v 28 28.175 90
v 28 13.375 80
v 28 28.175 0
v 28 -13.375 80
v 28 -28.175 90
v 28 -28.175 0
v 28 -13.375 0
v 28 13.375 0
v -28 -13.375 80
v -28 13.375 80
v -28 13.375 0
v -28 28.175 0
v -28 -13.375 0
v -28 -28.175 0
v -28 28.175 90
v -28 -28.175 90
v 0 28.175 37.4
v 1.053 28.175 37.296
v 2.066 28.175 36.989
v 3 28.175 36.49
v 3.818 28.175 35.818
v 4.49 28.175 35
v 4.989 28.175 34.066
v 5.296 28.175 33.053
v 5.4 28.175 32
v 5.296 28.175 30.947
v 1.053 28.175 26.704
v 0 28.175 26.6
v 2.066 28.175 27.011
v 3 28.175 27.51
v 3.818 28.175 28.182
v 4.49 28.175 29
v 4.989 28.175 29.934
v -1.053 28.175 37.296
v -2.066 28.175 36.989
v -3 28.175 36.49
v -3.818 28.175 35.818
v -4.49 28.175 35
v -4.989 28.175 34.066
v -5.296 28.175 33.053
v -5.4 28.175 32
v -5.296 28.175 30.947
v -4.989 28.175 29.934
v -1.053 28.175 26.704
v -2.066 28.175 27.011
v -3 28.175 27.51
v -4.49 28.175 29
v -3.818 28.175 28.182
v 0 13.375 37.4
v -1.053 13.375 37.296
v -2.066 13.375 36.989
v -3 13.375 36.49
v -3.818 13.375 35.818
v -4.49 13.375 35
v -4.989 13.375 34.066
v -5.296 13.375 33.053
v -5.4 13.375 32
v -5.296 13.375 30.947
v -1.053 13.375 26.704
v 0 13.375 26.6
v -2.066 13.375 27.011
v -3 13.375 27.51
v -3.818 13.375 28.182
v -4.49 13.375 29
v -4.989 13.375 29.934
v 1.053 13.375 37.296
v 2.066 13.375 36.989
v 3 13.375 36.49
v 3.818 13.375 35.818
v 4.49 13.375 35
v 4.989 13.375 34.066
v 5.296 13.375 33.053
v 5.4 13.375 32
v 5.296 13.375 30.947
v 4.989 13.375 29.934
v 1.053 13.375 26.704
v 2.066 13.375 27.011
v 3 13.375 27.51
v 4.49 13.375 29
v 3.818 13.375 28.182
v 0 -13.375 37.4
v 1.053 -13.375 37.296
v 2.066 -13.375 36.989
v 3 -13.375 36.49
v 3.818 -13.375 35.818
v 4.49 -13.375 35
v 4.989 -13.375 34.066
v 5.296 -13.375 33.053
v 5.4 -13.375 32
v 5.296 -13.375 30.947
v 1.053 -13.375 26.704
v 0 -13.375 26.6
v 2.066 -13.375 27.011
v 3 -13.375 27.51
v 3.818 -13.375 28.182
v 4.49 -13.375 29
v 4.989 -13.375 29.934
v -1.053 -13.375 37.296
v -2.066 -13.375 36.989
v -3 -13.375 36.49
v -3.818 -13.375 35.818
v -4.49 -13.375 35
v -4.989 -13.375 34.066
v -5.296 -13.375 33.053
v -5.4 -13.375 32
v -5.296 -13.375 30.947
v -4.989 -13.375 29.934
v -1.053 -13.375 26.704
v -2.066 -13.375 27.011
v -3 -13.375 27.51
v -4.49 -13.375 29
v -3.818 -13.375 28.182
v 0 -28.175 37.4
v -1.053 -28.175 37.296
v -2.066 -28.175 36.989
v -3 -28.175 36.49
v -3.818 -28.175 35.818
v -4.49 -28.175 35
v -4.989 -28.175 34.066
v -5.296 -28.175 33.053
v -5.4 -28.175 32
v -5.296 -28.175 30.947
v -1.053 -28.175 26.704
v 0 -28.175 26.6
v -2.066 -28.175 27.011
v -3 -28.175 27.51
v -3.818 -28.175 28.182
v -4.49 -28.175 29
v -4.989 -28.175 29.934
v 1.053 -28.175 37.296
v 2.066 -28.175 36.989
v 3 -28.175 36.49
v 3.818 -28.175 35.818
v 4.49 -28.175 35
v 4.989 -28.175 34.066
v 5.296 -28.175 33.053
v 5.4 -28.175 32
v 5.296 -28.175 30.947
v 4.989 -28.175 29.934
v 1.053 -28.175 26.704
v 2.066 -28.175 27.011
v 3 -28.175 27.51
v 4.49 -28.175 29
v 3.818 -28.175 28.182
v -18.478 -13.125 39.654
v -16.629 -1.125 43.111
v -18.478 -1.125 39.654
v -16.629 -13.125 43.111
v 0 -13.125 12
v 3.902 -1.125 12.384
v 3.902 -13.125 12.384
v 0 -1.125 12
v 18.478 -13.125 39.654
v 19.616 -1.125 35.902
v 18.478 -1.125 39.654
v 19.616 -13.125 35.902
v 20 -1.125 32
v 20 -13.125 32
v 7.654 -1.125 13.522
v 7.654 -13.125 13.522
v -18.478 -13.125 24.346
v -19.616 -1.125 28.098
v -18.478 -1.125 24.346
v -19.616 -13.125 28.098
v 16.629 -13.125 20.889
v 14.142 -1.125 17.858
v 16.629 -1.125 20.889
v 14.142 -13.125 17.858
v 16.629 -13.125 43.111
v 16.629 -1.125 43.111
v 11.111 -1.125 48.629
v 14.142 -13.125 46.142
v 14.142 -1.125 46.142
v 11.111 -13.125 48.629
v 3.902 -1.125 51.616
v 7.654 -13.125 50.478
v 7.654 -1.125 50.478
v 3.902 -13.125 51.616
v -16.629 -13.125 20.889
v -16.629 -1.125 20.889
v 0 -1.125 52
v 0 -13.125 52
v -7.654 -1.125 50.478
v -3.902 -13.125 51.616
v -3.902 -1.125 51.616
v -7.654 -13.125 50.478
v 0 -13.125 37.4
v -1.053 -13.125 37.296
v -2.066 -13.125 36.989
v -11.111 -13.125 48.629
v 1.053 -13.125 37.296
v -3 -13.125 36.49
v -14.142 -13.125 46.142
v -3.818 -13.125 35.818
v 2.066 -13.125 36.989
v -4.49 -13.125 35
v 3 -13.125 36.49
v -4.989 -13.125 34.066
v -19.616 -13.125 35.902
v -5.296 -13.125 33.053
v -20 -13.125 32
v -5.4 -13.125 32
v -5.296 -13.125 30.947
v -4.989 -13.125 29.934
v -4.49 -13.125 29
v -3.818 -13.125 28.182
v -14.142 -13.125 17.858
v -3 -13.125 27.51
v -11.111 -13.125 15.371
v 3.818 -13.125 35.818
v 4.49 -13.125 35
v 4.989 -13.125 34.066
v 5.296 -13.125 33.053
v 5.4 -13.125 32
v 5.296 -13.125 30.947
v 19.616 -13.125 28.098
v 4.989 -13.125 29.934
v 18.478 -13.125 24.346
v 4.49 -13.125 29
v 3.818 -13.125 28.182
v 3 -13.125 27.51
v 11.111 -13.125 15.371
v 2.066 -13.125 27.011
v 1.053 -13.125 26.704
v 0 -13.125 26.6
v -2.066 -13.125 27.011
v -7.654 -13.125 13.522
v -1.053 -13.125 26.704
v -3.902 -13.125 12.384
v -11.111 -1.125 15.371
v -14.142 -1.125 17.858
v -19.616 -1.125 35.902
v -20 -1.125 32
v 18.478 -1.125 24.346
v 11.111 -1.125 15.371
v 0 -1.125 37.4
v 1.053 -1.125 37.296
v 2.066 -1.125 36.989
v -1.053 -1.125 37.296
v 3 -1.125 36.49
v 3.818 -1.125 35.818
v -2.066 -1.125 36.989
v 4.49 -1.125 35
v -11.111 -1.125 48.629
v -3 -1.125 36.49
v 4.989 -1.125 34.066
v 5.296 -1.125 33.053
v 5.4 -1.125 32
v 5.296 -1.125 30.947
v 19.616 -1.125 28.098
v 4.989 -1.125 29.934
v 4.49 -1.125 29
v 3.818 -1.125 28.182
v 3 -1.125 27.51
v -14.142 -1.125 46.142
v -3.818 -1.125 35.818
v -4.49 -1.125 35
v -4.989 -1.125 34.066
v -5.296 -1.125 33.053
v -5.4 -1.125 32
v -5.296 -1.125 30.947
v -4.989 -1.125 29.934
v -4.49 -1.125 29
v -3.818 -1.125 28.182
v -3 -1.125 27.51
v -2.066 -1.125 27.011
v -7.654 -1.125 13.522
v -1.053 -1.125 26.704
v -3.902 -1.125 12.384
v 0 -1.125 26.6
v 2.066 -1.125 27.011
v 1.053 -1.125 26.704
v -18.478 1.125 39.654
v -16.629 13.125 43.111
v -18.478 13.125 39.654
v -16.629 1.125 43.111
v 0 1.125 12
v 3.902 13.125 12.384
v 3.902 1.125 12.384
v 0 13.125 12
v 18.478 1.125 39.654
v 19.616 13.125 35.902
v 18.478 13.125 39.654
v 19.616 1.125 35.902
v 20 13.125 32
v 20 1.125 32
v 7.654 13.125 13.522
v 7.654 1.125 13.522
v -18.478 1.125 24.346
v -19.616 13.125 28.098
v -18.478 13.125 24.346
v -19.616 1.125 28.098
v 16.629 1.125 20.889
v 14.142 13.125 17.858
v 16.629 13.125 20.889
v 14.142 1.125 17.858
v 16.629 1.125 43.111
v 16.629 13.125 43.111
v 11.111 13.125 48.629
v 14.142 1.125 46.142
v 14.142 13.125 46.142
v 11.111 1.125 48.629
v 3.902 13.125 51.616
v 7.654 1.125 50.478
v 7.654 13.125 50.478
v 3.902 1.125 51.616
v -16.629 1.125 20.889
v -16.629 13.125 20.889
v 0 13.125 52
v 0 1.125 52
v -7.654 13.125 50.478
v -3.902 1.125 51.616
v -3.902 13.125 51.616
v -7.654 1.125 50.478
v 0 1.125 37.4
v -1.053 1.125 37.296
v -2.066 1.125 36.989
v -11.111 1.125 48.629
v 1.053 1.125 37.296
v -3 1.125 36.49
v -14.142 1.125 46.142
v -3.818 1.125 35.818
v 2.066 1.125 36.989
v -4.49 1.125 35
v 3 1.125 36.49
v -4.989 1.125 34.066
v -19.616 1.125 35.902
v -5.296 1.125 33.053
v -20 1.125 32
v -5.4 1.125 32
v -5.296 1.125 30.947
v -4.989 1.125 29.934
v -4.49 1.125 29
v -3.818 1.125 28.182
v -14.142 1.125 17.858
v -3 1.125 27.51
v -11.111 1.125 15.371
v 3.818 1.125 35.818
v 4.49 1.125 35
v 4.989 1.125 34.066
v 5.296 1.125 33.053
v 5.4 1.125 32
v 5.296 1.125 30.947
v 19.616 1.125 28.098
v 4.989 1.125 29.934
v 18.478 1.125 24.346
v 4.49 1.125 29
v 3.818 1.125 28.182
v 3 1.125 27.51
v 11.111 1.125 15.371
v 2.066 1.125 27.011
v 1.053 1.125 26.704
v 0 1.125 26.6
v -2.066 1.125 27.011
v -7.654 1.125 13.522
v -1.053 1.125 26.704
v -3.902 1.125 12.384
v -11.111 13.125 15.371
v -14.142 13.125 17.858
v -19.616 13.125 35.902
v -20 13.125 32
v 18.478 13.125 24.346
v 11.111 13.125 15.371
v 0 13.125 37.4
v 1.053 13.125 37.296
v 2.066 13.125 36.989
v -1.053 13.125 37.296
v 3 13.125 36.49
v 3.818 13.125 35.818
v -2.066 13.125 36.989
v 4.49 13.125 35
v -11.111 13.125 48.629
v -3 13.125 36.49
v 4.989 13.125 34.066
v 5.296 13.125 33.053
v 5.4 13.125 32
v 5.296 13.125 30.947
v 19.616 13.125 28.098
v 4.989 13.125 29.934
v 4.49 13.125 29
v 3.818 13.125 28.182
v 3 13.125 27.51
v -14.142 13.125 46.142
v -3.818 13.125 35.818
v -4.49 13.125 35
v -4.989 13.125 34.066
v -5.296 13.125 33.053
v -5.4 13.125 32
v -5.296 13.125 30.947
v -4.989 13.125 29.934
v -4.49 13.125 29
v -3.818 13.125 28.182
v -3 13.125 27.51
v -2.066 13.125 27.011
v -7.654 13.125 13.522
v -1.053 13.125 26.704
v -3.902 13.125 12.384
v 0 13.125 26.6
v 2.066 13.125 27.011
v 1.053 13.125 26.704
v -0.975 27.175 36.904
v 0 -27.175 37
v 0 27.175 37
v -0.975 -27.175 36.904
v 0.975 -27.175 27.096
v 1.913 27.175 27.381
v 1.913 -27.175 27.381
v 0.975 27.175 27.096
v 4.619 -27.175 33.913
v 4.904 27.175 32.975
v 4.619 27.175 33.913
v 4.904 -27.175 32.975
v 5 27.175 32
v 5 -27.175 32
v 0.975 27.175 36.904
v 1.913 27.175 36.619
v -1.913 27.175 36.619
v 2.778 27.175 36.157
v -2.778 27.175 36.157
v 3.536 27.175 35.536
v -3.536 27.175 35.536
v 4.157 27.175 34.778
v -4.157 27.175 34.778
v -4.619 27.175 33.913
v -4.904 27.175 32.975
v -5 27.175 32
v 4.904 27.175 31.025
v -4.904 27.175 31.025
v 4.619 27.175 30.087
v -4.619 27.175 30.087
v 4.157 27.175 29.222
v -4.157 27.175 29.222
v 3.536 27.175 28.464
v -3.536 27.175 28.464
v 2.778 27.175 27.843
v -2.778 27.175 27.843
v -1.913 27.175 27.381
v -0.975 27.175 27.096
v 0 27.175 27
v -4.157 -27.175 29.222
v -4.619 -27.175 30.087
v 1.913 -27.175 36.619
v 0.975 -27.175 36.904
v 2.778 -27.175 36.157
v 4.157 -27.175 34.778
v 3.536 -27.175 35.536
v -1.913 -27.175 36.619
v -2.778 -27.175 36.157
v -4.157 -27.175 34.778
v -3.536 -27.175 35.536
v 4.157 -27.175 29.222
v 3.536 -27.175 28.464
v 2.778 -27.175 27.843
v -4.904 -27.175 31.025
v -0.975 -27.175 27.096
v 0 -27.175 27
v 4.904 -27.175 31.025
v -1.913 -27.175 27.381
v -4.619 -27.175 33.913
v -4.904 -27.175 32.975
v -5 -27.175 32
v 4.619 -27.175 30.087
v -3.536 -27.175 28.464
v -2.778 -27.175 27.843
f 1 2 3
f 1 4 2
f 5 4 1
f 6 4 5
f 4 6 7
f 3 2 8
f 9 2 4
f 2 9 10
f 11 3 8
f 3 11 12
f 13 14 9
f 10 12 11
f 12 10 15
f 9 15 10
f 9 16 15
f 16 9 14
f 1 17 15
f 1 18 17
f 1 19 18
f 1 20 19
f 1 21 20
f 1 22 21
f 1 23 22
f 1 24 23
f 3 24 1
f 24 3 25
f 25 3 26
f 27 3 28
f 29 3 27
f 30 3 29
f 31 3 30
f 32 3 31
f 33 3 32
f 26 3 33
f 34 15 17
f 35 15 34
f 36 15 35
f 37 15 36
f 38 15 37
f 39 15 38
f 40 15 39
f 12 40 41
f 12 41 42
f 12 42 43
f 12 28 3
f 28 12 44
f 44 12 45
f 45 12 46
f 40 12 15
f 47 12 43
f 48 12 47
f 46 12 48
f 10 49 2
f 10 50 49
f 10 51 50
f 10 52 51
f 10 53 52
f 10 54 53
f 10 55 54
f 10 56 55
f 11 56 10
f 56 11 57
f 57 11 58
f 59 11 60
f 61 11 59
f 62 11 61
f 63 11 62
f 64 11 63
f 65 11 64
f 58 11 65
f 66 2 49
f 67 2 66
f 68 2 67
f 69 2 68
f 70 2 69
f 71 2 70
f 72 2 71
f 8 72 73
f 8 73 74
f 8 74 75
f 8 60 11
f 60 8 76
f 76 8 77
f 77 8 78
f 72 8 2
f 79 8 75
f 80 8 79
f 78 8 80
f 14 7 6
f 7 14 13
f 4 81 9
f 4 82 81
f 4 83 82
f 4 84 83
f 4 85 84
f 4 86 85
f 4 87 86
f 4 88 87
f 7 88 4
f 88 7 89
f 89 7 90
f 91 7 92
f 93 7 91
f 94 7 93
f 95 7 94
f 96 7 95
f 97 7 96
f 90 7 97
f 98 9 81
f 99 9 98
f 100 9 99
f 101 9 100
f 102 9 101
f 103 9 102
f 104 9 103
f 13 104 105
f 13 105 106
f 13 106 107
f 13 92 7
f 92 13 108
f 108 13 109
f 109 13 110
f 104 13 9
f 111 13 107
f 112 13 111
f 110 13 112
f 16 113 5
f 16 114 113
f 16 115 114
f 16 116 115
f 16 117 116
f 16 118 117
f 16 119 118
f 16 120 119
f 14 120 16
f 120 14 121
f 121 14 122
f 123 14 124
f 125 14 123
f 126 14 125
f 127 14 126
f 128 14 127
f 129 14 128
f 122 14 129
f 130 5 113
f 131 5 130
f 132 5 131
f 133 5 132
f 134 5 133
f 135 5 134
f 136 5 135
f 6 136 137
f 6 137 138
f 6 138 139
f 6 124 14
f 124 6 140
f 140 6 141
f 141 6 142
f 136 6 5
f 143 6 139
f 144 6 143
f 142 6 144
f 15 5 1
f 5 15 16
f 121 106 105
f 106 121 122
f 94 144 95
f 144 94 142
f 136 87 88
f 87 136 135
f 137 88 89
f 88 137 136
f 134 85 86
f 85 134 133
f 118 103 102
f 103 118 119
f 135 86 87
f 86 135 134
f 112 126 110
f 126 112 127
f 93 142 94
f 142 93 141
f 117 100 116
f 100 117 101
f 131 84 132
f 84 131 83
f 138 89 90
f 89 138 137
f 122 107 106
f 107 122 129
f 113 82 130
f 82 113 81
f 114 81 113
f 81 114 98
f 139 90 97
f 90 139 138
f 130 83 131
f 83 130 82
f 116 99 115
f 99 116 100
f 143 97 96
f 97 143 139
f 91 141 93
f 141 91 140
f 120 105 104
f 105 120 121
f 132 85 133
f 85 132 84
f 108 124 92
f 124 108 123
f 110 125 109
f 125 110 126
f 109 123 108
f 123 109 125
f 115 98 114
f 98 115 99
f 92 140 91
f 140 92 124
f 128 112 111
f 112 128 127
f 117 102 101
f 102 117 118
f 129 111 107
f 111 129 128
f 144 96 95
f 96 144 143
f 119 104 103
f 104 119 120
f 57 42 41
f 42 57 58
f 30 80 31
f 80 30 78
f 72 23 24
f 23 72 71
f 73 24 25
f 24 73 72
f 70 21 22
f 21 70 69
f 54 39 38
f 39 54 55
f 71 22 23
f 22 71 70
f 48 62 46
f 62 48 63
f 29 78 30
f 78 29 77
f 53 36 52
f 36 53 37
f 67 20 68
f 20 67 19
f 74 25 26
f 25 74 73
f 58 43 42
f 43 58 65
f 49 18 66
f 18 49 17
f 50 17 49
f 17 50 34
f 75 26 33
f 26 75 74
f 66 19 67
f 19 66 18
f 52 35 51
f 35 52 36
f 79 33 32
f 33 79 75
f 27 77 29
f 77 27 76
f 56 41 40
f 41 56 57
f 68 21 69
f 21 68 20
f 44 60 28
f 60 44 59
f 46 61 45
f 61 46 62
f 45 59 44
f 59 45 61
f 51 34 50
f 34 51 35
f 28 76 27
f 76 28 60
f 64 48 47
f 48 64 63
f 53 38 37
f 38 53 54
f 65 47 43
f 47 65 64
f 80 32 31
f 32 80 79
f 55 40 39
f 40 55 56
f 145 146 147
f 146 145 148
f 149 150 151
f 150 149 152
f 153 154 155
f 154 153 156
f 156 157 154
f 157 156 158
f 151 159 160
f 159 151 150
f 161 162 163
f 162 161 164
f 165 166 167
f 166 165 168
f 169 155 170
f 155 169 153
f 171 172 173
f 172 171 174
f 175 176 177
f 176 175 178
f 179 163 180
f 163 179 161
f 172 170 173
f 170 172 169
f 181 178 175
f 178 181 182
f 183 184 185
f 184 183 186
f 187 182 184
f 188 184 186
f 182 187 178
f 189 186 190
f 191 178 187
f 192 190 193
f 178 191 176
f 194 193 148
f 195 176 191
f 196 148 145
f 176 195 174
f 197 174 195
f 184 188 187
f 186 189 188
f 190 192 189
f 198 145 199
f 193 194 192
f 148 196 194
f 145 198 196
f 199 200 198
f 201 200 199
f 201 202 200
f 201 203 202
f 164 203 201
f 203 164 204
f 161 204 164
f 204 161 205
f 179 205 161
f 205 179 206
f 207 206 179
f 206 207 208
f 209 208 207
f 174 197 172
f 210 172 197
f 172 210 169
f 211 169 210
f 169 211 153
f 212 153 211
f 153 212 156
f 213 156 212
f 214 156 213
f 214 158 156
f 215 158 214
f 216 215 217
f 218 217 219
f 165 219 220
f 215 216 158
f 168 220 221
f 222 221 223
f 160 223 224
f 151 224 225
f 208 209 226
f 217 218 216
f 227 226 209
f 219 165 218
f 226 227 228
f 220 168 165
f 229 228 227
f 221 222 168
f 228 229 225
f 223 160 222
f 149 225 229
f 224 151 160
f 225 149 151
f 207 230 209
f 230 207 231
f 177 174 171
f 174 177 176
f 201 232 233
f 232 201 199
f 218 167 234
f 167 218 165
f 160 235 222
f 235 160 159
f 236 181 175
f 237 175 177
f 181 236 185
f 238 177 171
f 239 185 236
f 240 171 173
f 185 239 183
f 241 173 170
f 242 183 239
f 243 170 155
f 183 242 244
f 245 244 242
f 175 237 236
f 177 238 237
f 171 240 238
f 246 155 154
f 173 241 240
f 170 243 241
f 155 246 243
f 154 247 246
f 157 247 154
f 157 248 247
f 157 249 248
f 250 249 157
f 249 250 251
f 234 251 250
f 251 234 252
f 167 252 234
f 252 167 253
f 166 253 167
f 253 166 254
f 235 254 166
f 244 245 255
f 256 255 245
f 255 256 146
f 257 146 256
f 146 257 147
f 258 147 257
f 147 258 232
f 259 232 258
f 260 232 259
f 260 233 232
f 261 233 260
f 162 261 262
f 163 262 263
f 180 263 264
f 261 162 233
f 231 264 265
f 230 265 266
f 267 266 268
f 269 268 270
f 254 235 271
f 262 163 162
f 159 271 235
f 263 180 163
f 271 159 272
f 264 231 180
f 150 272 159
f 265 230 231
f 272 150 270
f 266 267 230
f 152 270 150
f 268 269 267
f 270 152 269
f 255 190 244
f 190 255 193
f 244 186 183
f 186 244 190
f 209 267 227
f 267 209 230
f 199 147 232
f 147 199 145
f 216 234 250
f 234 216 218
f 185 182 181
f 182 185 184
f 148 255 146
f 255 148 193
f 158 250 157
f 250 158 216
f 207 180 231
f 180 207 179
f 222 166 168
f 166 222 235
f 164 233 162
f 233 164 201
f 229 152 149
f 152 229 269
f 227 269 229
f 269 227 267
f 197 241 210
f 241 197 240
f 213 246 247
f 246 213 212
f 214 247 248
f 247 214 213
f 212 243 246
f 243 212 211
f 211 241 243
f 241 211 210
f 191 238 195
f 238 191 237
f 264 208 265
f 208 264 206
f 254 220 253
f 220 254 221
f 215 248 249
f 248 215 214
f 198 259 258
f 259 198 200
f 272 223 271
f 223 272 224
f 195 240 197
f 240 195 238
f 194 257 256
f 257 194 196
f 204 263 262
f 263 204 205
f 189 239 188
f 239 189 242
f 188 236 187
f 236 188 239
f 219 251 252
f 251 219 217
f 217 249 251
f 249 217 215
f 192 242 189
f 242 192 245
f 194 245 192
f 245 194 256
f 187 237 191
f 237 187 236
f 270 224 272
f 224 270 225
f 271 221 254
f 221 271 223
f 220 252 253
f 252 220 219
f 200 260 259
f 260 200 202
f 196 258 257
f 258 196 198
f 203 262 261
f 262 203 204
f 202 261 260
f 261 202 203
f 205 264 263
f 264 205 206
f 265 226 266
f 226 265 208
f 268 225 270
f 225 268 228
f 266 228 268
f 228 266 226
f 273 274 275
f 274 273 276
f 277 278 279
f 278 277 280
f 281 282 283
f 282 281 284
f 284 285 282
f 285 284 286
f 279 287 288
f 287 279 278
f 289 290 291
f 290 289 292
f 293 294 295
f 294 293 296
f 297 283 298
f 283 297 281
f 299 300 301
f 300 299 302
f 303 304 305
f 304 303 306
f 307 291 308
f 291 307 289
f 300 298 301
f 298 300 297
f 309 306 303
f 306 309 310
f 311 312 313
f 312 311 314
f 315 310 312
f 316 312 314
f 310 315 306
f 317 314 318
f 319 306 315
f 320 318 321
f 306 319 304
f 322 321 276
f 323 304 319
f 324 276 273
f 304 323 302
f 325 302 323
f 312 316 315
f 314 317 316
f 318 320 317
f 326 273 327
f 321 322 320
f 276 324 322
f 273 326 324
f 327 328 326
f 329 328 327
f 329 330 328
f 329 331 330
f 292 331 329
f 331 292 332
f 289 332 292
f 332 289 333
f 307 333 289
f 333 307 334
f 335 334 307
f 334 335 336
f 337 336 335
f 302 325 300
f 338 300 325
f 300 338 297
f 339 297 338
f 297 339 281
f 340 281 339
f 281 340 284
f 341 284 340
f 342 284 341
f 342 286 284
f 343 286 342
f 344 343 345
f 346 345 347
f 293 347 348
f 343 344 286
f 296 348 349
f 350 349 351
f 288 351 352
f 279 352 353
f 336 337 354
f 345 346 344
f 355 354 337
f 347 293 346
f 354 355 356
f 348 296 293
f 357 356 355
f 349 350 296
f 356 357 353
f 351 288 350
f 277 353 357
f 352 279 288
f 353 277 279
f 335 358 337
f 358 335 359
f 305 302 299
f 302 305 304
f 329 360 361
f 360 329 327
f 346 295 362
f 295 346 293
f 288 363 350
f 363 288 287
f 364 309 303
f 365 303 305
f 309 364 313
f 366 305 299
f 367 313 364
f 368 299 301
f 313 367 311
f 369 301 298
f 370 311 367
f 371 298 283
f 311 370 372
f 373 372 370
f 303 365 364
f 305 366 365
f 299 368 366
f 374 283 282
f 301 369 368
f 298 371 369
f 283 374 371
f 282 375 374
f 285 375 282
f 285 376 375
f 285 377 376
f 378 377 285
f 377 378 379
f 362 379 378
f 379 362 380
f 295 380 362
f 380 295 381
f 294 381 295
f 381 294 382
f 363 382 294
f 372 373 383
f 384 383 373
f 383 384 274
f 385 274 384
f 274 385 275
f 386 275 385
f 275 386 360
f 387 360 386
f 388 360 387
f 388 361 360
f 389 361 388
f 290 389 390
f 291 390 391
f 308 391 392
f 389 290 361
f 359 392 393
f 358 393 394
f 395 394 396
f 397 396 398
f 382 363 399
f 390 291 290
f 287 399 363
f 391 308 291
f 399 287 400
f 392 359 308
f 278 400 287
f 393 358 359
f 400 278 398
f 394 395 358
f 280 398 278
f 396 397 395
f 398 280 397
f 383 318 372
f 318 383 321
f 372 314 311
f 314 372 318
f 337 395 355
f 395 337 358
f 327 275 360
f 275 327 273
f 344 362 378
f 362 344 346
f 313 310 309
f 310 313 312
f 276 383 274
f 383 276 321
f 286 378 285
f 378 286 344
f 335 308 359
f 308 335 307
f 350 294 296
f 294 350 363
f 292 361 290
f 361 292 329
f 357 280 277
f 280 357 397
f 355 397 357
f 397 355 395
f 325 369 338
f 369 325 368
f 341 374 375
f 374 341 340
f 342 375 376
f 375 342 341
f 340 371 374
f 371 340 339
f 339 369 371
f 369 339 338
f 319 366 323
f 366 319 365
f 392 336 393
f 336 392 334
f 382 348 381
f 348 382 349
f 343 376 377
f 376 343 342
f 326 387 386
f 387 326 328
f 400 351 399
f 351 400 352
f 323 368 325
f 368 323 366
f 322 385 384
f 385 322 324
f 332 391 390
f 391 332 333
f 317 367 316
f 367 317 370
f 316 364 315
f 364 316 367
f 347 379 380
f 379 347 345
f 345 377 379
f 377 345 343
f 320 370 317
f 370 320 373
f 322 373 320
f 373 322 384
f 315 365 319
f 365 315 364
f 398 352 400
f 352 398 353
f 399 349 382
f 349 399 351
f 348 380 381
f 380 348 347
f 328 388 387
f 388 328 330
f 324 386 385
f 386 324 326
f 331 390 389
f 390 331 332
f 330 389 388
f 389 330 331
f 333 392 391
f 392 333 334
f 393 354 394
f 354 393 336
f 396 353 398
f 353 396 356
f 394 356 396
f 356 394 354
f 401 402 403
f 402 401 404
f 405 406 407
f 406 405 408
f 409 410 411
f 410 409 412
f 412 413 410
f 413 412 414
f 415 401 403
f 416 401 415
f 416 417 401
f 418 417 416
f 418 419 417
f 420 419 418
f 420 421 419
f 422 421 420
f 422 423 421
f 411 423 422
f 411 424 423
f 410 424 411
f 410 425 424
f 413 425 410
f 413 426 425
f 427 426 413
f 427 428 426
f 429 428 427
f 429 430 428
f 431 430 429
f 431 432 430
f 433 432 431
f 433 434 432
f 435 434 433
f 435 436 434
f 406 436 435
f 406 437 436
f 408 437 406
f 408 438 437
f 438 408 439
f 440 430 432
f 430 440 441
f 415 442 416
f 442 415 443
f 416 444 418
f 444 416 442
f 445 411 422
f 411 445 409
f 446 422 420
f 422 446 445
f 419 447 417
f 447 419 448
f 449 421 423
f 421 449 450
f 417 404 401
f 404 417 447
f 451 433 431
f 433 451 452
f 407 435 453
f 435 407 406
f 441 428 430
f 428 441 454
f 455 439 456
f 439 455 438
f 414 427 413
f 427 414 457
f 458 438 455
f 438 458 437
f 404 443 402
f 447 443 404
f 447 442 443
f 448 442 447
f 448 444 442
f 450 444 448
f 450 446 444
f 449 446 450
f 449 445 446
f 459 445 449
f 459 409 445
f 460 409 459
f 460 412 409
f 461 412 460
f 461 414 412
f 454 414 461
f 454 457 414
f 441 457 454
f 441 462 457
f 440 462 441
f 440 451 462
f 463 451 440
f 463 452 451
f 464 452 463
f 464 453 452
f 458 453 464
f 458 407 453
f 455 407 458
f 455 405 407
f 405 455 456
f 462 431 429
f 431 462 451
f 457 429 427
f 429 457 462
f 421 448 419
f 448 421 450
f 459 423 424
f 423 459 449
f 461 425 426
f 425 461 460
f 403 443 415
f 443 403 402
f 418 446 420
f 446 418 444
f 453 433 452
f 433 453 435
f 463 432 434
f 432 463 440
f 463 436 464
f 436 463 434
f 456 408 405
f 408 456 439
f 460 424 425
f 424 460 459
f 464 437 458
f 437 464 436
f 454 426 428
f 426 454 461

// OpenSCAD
$fn = 32;

// ------------------------------------------------------------------------
// Trolley wheel set: wheels d40, fork 80 mm tall
// Every part is its own module, assembly() places every instance.
// ------------------------------------------------------------------------

// --- part 1 ---
module trolley_fork() {
  difference() {
    union() {
      translate([-28, 13.375, 0]) cube([56, 14.8, 80]);
      translate([-28, -28.175, 0]) cube([56, 14.8, 80]);
      translate([-28, -28.175, 80]) cube([56, 56.35, 10]);
    }
    translate([0, -20.775, 32]) rotate([90, 0, 0]) cylinder(h = 16.8, d = 10.8, center = true);
    translate([0, 20.775, 32]) rotate([90, 0, 0]) cylinder(h = 16.8, d = 10.8, center = true);
  }
}

// --- part 2 ---
module trolley_wheel() {
  difference() {
      translate([0, 0, 0]) cylinder(h = 12, d = 40);
      translate([0, 0, -1]) cylinder(h = 14, d = 10.8);
    }
}

// --- part 3 ---
module trolley_axle() {
  translate([0, 0, -27.175]) cylinder(h = 54.35, d = 10);
}

// --- assembly ---
module assembly() {
  color([0.80, 0.24, 0.20]) translate([0, 0, 0]) rotate([0, 0, 0]) trolley_fork();
  color([0.20, 0.45, 0.75]) translate([0, -1.125, 32]) rotate([90, 0, 0]) trolley_wheel();
  color([0.25, 0.62, 0.32]) translate([0, 13.125, 32]) rotate([90, 0, 0]) trolley_wheel();
  color([0.92, 0.70, 0.18]) translate([0, 0, 32]) rotate([90, 0, 0]) trolley_axle();
}

assembly();
